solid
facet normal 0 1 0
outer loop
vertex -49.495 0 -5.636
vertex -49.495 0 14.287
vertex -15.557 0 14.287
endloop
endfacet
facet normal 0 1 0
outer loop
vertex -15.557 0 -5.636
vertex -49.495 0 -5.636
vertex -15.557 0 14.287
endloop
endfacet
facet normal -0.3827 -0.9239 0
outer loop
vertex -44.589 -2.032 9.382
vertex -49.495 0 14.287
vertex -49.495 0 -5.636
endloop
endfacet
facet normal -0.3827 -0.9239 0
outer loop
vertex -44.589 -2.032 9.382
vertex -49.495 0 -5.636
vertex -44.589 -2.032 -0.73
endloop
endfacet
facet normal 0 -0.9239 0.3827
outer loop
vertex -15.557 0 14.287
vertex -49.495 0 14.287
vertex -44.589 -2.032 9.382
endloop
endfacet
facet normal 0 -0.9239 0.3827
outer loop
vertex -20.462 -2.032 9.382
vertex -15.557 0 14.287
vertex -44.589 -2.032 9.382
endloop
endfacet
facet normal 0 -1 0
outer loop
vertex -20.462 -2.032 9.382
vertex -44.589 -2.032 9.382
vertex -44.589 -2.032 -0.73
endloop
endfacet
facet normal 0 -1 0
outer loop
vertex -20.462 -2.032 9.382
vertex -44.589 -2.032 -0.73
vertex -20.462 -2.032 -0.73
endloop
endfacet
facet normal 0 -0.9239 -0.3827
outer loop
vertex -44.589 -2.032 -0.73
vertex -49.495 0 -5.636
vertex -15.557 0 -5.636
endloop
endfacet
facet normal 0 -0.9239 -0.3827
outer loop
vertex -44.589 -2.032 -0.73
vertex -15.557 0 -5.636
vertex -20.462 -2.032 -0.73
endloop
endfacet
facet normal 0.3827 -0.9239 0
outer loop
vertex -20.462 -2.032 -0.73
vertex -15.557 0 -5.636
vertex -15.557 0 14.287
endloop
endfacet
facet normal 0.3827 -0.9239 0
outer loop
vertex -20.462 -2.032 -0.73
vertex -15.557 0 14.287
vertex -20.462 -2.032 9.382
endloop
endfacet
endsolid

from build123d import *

# Parameters (mm, degrees)
F0_W        = 44.4469191134
F0_H        = 30.4321236908
F1_DEPTH    = 2.032
F2_T1_DEPTH = 70.5752182711
F2_T3_DEPTH = 56.5604228486
F3_T1_DEPTH = 60.6284503053
F3_T3_DEPTH = 46.6136548828


# Not quite as in the source:
# - a fillet or chamfer that OpenCascade refuses, or shapes differently, is made with other operations: its cross-section is extruded or revolved along the edge and cut away or added
# - a feature of the source that left no trace in its solid (it failed there, or was rolled back) is left out


with BuildPart() as f1:
    # F0 (on Front) → F1 (new body)
    with BuildSketch(Plane.XZ):
        with Locations((-32.5259137899, 4.3256785721)):
            Rectangle(F0_W, F0_H)
    extrude(amount=F1_DEPTH)

    # F2: chamfer of 5.08 on 4 edges, made by hand

    # F2_s2 → F2_t1 (cut)
    with BuildSketch(Plane.YZ.offset(-67.8135229254)):
        Polygon((3.048, 19.5417404175), (-2.032, 14.4617404175), (-2.032, 19.5417404175), align=None)
        Polygon((3.048, -10.8903832734), (-2.032, -5.8103832734), (-2.032, -10.8903832734), align=None)
    extrude(amount=F2_T1_DEPTH, mode=Mode.SUBTRACT)

    # F2_s4 → F2_t3 (cut)
    with BuildSketch(Plane.XY.offset(-23.9545328522)):
        Polygon((-54.7493733466, 3.048), (-49.6693733466, -2.032), (-54.7493733466, -2.032), align=None)
        Polygon((-10.3024542332, 3.048), (-15.3824542332, -2.032), (-10.3024542332, -2.032), align=None)
    extrude(amount=F2_T3_DEPTH, mode=Mode.SUBTRACT)

    # F3: chamfer of 5.08 on 4 edges, made by hand

    # F3_s2 → F3_t1 (cut)
    with BuildSketch(Plane.YZ.offset(-62.8401389426)):
        Polygon((1.5601024484, -9.4024857218), (-2.032, -0.7303832734), (-2.032, -5.8103832734), align=None)
        Polygon((1.5601024484, 18.0538428659), (-2.032, 9.3817404175), (-2.032, 14.4617404175), align=None)
    extrude(amount=F3_T1_DEPTH, mode=Mode.SUBTRACT)

    # F3_s4 → F3_t3 (cut)
    with BuildSketch(Plane.XY.offset(-18.9811488694)):
        Polygon((-53.261475795, 1.5601024484), (-44.5893733466, -2.032), (-49.6693733466, -2.032), align=None)
        Polygon((-11.7903517848, 1.5601024484), (-20.4624542332, -2.032), (-15.3824542332, -2.032), align=None)
    extrude(amount=F3_T3_DEPTH, mode=Mode.SUBTRACT)


solid = f1.part
